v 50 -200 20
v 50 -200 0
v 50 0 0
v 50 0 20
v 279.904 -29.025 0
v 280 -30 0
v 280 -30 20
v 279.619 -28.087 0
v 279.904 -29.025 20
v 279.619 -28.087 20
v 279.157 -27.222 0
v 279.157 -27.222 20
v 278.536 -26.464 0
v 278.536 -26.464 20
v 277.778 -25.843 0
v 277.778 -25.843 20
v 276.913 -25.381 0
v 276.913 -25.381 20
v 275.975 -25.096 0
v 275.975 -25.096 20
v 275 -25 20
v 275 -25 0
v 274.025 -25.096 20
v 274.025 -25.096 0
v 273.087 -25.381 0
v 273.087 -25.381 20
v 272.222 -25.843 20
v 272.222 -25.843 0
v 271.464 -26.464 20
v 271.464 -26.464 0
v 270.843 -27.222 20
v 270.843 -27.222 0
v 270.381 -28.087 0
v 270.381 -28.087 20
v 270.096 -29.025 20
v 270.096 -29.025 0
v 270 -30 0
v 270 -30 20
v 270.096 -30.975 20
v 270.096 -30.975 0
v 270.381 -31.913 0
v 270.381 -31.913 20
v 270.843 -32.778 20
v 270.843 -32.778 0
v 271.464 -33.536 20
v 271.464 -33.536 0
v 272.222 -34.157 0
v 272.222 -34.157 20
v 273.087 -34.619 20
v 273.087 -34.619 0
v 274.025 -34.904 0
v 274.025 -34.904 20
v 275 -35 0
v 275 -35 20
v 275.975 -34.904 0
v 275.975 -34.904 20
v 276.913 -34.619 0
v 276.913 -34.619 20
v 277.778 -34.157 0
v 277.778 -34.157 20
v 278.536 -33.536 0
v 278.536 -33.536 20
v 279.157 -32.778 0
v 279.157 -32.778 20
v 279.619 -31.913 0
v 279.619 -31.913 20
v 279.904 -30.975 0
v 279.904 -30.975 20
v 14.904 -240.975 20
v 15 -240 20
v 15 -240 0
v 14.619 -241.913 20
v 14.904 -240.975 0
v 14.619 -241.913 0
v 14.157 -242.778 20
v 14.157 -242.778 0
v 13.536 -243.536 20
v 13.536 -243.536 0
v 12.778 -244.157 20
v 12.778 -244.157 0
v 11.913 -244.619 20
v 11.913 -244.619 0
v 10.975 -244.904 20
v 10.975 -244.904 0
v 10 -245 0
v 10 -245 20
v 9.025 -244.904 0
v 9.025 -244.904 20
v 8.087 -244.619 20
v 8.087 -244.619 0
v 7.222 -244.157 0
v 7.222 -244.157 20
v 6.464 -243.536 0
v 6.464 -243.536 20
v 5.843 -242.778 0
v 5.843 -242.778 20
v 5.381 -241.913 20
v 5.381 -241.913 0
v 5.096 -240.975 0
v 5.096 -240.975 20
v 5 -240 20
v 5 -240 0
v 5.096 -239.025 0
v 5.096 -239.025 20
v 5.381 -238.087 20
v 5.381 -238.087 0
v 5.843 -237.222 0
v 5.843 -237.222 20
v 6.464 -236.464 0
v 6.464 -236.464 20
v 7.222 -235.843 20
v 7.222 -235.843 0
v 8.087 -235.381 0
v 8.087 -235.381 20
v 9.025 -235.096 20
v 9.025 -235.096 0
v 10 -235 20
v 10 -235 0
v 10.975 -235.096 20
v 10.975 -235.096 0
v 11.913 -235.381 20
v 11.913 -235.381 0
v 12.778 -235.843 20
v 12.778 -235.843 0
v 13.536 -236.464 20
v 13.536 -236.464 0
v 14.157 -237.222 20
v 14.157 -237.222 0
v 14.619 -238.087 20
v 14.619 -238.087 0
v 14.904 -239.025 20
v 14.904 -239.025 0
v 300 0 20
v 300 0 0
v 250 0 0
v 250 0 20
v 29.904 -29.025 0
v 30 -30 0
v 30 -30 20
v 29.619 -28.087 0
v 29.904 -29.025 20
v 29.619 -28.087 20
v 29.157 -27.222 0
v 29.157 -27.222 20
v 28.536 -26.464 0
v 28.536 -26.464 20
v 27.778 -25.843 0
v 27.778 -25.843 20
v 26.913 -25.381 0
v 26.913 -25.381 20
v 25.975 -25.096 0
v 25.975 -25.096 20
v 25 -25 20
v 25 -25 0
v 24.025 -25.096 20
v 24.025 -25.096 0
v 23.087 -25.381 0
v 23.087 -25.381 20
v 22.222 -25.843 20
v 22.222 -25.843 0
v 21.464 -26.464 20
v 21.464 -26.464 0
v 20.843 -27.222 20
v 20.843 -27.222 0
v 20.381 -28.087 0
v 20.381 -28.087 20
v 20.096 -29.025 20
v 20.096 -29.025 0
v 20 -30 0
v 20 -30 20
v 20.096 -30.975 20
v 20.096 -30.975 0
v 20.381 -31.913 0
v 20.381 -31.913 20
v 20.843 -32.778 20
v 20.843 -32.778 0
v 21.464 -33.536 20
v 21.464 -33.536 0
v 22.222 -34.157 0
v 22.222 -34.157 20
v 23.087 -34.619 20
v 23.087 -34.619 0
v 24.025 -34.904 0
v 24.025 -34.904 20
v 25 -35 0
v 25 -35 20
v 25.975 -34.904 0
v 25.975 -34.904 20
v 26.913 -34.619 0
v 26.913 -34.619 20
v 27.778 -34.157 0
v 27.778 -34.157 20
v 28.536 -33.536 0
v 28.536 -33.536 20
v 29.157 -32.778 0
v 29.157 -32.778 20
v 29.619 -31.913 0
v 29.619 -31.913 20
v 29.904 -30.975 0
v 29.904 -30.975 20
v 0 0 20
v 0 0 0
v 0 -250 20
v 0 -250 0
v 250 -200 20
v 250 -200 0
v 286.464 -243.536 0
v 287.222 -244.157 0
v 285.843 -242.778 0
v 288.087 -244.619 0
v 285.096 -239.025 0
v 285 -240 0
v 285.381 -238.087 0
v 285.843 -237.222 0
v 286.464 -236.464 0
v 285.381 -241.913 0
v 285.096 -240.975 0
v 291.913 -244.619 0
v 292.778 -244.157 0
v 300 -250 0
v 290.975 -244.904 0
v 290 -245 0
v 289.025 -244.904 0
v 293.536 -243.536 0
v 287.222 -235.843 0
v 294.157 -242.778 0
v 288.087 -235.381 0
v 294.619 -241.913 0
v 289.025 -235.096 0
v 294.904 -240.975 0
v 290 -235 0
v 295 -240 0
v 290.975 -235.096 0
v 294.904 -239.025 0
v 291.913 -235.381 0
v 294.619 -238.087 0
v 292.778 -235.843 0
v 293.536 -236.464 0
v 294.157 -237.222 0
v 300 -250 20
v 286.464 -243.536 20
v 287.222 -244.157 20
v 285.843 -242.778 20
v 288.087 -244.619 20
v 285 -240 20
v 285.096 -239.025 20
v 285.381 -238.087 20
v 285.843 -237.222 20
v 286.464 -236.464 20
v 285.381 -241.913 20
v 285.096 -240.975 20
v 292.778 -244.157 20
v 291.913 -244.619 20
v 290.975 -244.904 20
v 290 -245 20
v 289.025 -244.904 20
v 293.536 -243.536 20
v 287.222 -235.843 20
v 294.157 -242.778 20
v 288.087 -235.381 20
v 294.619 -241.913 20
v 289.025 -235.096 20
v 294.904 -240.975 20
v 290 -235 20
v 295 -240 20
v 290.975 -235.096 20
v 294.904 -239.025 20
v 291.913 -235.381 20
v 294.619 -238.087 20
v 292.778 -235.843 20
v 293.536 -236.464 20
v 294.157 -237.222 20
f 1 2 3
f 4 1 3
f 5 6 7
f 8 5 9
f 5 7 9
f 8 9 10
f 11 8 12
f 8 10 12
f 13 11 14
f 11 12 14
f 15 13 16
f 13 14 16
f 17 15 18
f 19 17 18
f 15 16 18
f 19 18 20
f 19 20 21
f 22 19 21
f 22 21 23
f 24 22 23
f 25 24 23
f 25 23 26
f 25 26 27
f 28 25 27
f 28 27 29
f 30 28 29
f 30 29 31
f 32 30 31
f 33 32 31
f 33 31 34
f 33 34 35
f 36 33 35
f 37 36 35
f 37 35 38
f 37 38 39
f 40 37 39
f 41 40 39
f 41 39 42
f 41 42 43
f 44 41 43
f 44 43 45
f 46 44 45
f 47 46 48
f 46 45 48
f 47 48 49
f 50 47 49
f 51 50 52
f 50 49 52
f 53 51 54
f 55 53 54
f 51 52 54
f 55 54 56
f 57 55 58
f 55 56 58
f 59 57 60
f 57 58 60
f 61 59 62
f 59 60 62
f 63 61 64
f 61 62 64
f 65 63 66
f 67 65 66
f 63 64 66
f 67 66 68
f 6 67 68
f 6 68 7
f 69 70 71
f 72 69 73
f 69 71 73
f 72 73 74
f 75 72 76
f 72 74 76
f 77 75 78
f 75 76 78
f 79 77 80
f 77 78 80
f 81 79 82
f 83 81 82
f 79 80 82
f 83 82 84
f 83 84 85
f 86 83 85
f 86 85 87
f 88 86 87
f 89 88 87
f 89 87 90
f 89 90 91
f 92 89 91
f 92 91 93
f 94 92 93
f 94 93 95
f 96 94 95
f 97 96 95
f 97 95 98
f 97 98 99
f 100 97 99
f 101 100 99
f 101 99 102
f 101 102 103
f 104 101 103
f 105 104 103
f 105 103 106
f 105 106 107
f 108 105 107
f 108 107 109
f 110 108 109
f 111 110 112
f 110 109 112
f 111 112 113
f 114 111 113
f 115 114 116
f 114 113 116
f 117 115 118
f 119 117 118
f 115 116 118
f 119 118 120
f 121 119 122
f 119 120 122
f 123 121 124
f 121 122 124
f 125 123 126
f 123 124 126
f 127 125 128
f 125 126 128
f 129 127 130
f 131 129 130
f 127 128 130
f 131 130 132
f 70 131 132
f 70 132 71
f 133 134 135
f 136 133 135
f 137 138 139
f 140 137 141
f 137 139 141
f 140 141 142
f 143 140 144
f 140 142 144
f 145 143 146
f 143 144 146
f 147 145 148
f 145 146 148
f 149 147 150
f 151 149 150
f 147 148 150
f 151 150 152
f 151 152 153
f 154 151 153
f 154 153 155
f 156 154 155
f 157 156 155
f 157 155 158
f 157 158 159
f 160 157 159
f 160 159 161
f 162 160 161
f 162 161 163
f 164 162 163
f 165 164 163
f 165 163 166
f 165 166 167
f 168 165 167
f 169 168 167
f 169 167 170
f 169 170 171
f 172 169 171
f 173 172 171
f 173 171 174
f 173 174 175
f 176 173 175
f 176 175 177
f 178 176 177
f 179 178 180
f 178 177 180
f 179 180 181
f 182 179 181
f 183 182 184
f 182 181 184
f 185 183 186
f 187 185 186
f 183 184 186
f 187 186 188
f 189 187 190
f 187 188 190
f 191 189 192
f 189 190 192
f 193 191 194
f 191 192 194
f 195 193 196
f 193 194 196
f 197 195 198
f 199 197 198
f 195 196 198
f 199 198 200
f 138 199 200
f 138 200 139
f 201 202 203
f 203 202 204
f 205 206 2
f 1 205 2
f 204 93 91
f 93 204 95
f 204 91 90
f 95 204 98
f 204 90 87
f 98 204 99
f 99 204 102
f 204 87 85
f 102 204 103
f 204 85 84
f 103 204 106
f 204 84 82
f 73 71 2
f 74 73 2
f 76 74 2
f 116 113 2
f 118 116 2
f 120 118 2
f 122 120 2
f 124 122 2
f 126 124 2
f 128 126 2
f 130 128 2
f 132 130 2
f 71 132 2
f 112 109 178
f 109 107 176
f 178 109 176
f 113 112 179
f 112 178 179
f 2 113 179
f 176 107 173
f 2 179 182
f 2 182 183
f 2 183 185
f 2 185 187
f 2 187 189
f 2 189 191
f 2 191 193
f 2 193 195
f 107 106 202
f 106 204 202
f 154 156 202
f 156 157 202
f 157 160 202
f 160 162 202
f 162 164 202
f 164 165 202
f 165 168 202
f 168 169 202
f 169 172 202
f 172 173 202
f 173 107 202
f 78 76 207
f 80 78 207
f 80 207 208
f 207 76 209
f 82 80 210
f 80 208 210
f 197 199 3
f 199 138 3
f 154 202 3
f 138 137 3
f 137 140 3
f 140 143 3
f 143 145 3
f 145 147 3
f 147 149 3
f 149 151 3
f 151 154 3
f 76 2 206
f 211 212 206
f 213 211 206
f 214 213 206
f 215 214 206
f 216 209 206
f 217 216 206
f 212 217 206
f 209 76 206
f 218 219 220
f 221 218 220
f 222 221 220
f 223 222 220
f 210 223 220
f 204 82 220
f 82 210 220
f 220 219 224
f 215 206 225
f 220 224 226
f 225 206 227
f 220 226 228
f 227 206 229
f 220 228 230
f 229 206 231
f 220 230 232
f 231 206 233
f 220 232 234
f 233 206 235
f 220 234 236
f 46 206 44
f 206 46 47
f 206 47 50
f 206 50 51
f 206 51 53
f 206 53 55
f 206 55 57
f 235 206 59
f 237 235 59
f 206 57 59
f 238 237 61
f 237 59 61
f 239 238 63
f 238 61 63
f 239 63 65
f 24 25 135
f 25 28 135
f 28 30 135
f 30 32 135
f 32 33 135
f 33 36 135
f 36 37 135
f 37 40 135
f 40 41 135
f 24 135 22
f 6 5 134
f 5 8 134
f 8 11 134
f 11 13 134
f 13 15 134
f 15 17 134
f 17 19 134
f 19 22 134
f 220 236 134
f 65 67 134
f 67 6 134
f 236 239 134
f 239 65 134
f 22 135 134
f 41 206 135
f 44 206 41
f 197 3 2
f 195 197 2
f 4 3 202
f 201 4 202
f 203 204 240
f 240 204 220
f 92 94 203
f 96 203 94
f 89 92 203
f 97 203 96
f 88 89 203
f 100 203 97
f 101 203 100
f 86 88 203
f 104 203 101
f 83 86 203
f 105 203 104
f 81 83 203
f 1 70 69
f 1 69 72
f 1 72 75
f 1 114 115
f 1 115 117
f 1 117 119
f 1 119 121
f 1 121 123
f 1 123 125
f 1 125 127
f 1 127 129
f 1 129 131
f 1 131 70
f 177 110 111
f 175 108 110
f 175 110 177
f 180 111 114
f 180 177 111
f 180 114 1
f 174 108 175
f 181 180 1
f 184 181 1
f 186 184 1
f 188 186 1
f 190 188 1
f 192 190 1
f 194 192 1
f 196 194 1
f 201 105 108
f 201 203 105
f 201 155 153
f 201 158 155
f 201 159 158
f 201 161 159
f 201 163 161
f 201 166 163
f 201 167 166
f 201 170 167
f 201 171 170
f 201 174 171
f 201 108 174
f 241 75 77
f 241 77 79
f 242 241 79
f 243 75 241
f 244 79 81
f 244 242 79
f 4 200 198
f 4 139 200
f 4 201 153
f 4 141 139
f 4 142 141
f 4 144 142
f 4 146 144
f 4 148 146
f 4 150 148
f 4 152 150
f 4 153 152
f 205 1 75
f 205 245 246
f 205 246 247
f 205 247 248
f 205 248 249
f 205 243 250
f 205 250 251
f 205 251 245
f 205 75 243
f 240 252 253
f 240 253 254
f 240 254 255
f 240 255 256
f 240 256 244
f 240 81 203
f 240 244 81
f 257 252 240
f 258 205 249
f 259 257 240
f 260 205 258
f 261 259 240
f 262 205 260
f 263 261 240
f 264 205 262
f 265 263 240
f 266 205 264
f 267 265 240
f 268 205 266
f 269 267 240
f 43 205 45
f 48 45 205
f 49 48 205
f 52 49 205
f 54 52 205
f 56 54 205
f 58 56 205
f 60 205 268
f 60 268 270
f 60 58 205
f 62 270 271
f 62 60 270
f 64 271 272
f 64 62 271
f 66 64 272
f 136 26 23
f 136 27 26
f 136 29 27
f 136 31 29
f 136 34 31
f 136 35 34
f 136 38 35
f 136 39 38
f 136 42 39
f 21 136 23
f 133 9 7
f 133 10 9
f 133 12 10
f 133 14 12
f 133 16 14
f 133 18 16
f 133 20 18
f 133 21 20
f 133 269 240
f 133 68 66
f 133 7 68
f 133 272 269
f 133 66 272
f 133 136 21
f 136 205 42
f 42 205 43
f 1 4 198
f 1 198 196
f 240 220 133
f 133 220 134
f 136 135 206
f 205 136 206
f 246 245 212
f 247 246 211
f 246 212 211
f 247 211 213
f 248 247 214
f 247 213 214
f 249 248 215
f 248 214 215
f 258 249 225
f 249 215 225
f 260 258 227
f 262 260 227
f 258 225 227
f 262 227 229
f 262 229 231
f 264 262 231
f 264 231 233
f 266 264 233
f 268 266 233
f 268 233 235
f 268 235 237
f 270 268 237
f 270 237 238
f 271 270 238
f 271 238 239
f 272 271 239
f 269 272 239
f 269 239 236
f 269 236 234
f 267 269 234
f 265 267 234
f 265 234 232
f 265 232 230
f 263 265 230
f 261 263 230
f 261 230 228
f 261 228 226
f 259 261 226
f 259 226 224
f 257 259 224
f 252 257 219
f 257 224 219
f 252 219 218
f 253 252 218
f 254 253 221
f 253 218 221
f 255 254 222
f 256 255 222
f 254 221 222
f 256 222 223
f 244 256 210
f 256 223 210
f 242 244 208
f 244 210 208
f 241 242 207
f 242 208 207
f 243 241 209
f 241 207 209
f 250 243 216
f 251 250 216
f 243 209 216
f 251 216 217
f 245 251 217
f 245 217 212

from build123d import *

# Parameters (mm, degrees)
BOSS_EXTRUDE1_DEPTH = 20
CUT_EXTRUDE1_REACH  = 393.024
SKETCH2_R           = 5
CUT_EXTRUDE2_REACH  = 393.024
SKETCH3_R           = 5


with BuildPart() as part:
    # Sketch1 → Boss-Extrude1 (new body)
    with BuildSketch(Plane.XY):
        Polygon((0, 0), (0, -250), (300, -250), (300, 0), (250, 0), (250, -200), (50, -200), (50, 0), align=None)
    extrude(amount=BOSS_EXTRUDE1_DEPTH)

    # Sketch2 → Cut-Extrude1 (cut, up to next)
    with BuildSketch(Plane.XY.offset(20), mode=Mode.PRIVATE) as cut_extrude1_sk1:
        with Locations((25, -30)):
            Circle(SKETCH2_R)
    cut_extrude1_tool1 = extrude(cut_extrude1_sk1.sketch, amount=-CUT_EXTRUDE1_REACH, mode=Mode.PRIVATE) & part.part
    # Sketch2 → Cut-Extrude1 (cut, up to next)
    with BuildSketch(Plane.XY.offset(20), mode=Mode.PRIVATE) as cut_extrude1_sk2:
        with Locations((275, -30)):
            Circle(SKETCH2_R)
    cut_extrude1_tool2 = extrude(cut_extrude1_sk2.sketch, amount=-CUT_EXTRUDE1_REACH, mode=Mode.PRIVATE) & part.part
    add(cut_extrude1_tool1.solids().sort_by_distance((25, -30, 20))[0], mode=Mode.SUBTRACT)
    add(cut_extrude1_tool2.solids().sort_by_distance((275, -30, 20))[0], mode=Mode.SUBTRACT)

    # Sketch3 → Cut-Extrude2 (cut, up to next)
    with BuildSketch(Plane(origin=(0, 0, 0), x_dir=(-1, 0, 0), z_dir=(0, 0, -1)), mode=Mode.PRIVATE) as cut_extrude2_sk1:
        with Locations((-290, -240)):
            Circle(SKETCH3_R)
    cut_extrude2_tool1 = extrude(cut_extrude2_sk1.sketch, amount=-CUT_EXTRUDE2_REACH, mode=Mode.PRIVATE) & part.part
    # Sketch3 → Cut-Extrude2 (cut, up to next)
    with BuildSketch(Plane(origin=(0, 0, 0), x_dir=(-1, 0, 0), z_dir=(0, 0, -1)), mode=Mode.PRIVATE) as cut_extrude2_sk2:
        with Locations(Location((-10, -240, 0), (0, 0, 180))):
            Circle(SKETCH3_R)
    cut_extrude2_tool2 = extrude(cut_extrude2_sk2.sketch, amount=-CUT_EXTRUDE2_REACH, mode=Mode.PRIVATE) & part.part
    add(cut_extrude2_tool1.solids().sort_by_distance((290, -240, 0))[0], mode=Mode.SUBTRACT)
    add(cut_extrude2_tool2.solids().sort_by_distance((10, -240, 0))[0], mode=Mode.SUBTRACT)


solid = part.part
